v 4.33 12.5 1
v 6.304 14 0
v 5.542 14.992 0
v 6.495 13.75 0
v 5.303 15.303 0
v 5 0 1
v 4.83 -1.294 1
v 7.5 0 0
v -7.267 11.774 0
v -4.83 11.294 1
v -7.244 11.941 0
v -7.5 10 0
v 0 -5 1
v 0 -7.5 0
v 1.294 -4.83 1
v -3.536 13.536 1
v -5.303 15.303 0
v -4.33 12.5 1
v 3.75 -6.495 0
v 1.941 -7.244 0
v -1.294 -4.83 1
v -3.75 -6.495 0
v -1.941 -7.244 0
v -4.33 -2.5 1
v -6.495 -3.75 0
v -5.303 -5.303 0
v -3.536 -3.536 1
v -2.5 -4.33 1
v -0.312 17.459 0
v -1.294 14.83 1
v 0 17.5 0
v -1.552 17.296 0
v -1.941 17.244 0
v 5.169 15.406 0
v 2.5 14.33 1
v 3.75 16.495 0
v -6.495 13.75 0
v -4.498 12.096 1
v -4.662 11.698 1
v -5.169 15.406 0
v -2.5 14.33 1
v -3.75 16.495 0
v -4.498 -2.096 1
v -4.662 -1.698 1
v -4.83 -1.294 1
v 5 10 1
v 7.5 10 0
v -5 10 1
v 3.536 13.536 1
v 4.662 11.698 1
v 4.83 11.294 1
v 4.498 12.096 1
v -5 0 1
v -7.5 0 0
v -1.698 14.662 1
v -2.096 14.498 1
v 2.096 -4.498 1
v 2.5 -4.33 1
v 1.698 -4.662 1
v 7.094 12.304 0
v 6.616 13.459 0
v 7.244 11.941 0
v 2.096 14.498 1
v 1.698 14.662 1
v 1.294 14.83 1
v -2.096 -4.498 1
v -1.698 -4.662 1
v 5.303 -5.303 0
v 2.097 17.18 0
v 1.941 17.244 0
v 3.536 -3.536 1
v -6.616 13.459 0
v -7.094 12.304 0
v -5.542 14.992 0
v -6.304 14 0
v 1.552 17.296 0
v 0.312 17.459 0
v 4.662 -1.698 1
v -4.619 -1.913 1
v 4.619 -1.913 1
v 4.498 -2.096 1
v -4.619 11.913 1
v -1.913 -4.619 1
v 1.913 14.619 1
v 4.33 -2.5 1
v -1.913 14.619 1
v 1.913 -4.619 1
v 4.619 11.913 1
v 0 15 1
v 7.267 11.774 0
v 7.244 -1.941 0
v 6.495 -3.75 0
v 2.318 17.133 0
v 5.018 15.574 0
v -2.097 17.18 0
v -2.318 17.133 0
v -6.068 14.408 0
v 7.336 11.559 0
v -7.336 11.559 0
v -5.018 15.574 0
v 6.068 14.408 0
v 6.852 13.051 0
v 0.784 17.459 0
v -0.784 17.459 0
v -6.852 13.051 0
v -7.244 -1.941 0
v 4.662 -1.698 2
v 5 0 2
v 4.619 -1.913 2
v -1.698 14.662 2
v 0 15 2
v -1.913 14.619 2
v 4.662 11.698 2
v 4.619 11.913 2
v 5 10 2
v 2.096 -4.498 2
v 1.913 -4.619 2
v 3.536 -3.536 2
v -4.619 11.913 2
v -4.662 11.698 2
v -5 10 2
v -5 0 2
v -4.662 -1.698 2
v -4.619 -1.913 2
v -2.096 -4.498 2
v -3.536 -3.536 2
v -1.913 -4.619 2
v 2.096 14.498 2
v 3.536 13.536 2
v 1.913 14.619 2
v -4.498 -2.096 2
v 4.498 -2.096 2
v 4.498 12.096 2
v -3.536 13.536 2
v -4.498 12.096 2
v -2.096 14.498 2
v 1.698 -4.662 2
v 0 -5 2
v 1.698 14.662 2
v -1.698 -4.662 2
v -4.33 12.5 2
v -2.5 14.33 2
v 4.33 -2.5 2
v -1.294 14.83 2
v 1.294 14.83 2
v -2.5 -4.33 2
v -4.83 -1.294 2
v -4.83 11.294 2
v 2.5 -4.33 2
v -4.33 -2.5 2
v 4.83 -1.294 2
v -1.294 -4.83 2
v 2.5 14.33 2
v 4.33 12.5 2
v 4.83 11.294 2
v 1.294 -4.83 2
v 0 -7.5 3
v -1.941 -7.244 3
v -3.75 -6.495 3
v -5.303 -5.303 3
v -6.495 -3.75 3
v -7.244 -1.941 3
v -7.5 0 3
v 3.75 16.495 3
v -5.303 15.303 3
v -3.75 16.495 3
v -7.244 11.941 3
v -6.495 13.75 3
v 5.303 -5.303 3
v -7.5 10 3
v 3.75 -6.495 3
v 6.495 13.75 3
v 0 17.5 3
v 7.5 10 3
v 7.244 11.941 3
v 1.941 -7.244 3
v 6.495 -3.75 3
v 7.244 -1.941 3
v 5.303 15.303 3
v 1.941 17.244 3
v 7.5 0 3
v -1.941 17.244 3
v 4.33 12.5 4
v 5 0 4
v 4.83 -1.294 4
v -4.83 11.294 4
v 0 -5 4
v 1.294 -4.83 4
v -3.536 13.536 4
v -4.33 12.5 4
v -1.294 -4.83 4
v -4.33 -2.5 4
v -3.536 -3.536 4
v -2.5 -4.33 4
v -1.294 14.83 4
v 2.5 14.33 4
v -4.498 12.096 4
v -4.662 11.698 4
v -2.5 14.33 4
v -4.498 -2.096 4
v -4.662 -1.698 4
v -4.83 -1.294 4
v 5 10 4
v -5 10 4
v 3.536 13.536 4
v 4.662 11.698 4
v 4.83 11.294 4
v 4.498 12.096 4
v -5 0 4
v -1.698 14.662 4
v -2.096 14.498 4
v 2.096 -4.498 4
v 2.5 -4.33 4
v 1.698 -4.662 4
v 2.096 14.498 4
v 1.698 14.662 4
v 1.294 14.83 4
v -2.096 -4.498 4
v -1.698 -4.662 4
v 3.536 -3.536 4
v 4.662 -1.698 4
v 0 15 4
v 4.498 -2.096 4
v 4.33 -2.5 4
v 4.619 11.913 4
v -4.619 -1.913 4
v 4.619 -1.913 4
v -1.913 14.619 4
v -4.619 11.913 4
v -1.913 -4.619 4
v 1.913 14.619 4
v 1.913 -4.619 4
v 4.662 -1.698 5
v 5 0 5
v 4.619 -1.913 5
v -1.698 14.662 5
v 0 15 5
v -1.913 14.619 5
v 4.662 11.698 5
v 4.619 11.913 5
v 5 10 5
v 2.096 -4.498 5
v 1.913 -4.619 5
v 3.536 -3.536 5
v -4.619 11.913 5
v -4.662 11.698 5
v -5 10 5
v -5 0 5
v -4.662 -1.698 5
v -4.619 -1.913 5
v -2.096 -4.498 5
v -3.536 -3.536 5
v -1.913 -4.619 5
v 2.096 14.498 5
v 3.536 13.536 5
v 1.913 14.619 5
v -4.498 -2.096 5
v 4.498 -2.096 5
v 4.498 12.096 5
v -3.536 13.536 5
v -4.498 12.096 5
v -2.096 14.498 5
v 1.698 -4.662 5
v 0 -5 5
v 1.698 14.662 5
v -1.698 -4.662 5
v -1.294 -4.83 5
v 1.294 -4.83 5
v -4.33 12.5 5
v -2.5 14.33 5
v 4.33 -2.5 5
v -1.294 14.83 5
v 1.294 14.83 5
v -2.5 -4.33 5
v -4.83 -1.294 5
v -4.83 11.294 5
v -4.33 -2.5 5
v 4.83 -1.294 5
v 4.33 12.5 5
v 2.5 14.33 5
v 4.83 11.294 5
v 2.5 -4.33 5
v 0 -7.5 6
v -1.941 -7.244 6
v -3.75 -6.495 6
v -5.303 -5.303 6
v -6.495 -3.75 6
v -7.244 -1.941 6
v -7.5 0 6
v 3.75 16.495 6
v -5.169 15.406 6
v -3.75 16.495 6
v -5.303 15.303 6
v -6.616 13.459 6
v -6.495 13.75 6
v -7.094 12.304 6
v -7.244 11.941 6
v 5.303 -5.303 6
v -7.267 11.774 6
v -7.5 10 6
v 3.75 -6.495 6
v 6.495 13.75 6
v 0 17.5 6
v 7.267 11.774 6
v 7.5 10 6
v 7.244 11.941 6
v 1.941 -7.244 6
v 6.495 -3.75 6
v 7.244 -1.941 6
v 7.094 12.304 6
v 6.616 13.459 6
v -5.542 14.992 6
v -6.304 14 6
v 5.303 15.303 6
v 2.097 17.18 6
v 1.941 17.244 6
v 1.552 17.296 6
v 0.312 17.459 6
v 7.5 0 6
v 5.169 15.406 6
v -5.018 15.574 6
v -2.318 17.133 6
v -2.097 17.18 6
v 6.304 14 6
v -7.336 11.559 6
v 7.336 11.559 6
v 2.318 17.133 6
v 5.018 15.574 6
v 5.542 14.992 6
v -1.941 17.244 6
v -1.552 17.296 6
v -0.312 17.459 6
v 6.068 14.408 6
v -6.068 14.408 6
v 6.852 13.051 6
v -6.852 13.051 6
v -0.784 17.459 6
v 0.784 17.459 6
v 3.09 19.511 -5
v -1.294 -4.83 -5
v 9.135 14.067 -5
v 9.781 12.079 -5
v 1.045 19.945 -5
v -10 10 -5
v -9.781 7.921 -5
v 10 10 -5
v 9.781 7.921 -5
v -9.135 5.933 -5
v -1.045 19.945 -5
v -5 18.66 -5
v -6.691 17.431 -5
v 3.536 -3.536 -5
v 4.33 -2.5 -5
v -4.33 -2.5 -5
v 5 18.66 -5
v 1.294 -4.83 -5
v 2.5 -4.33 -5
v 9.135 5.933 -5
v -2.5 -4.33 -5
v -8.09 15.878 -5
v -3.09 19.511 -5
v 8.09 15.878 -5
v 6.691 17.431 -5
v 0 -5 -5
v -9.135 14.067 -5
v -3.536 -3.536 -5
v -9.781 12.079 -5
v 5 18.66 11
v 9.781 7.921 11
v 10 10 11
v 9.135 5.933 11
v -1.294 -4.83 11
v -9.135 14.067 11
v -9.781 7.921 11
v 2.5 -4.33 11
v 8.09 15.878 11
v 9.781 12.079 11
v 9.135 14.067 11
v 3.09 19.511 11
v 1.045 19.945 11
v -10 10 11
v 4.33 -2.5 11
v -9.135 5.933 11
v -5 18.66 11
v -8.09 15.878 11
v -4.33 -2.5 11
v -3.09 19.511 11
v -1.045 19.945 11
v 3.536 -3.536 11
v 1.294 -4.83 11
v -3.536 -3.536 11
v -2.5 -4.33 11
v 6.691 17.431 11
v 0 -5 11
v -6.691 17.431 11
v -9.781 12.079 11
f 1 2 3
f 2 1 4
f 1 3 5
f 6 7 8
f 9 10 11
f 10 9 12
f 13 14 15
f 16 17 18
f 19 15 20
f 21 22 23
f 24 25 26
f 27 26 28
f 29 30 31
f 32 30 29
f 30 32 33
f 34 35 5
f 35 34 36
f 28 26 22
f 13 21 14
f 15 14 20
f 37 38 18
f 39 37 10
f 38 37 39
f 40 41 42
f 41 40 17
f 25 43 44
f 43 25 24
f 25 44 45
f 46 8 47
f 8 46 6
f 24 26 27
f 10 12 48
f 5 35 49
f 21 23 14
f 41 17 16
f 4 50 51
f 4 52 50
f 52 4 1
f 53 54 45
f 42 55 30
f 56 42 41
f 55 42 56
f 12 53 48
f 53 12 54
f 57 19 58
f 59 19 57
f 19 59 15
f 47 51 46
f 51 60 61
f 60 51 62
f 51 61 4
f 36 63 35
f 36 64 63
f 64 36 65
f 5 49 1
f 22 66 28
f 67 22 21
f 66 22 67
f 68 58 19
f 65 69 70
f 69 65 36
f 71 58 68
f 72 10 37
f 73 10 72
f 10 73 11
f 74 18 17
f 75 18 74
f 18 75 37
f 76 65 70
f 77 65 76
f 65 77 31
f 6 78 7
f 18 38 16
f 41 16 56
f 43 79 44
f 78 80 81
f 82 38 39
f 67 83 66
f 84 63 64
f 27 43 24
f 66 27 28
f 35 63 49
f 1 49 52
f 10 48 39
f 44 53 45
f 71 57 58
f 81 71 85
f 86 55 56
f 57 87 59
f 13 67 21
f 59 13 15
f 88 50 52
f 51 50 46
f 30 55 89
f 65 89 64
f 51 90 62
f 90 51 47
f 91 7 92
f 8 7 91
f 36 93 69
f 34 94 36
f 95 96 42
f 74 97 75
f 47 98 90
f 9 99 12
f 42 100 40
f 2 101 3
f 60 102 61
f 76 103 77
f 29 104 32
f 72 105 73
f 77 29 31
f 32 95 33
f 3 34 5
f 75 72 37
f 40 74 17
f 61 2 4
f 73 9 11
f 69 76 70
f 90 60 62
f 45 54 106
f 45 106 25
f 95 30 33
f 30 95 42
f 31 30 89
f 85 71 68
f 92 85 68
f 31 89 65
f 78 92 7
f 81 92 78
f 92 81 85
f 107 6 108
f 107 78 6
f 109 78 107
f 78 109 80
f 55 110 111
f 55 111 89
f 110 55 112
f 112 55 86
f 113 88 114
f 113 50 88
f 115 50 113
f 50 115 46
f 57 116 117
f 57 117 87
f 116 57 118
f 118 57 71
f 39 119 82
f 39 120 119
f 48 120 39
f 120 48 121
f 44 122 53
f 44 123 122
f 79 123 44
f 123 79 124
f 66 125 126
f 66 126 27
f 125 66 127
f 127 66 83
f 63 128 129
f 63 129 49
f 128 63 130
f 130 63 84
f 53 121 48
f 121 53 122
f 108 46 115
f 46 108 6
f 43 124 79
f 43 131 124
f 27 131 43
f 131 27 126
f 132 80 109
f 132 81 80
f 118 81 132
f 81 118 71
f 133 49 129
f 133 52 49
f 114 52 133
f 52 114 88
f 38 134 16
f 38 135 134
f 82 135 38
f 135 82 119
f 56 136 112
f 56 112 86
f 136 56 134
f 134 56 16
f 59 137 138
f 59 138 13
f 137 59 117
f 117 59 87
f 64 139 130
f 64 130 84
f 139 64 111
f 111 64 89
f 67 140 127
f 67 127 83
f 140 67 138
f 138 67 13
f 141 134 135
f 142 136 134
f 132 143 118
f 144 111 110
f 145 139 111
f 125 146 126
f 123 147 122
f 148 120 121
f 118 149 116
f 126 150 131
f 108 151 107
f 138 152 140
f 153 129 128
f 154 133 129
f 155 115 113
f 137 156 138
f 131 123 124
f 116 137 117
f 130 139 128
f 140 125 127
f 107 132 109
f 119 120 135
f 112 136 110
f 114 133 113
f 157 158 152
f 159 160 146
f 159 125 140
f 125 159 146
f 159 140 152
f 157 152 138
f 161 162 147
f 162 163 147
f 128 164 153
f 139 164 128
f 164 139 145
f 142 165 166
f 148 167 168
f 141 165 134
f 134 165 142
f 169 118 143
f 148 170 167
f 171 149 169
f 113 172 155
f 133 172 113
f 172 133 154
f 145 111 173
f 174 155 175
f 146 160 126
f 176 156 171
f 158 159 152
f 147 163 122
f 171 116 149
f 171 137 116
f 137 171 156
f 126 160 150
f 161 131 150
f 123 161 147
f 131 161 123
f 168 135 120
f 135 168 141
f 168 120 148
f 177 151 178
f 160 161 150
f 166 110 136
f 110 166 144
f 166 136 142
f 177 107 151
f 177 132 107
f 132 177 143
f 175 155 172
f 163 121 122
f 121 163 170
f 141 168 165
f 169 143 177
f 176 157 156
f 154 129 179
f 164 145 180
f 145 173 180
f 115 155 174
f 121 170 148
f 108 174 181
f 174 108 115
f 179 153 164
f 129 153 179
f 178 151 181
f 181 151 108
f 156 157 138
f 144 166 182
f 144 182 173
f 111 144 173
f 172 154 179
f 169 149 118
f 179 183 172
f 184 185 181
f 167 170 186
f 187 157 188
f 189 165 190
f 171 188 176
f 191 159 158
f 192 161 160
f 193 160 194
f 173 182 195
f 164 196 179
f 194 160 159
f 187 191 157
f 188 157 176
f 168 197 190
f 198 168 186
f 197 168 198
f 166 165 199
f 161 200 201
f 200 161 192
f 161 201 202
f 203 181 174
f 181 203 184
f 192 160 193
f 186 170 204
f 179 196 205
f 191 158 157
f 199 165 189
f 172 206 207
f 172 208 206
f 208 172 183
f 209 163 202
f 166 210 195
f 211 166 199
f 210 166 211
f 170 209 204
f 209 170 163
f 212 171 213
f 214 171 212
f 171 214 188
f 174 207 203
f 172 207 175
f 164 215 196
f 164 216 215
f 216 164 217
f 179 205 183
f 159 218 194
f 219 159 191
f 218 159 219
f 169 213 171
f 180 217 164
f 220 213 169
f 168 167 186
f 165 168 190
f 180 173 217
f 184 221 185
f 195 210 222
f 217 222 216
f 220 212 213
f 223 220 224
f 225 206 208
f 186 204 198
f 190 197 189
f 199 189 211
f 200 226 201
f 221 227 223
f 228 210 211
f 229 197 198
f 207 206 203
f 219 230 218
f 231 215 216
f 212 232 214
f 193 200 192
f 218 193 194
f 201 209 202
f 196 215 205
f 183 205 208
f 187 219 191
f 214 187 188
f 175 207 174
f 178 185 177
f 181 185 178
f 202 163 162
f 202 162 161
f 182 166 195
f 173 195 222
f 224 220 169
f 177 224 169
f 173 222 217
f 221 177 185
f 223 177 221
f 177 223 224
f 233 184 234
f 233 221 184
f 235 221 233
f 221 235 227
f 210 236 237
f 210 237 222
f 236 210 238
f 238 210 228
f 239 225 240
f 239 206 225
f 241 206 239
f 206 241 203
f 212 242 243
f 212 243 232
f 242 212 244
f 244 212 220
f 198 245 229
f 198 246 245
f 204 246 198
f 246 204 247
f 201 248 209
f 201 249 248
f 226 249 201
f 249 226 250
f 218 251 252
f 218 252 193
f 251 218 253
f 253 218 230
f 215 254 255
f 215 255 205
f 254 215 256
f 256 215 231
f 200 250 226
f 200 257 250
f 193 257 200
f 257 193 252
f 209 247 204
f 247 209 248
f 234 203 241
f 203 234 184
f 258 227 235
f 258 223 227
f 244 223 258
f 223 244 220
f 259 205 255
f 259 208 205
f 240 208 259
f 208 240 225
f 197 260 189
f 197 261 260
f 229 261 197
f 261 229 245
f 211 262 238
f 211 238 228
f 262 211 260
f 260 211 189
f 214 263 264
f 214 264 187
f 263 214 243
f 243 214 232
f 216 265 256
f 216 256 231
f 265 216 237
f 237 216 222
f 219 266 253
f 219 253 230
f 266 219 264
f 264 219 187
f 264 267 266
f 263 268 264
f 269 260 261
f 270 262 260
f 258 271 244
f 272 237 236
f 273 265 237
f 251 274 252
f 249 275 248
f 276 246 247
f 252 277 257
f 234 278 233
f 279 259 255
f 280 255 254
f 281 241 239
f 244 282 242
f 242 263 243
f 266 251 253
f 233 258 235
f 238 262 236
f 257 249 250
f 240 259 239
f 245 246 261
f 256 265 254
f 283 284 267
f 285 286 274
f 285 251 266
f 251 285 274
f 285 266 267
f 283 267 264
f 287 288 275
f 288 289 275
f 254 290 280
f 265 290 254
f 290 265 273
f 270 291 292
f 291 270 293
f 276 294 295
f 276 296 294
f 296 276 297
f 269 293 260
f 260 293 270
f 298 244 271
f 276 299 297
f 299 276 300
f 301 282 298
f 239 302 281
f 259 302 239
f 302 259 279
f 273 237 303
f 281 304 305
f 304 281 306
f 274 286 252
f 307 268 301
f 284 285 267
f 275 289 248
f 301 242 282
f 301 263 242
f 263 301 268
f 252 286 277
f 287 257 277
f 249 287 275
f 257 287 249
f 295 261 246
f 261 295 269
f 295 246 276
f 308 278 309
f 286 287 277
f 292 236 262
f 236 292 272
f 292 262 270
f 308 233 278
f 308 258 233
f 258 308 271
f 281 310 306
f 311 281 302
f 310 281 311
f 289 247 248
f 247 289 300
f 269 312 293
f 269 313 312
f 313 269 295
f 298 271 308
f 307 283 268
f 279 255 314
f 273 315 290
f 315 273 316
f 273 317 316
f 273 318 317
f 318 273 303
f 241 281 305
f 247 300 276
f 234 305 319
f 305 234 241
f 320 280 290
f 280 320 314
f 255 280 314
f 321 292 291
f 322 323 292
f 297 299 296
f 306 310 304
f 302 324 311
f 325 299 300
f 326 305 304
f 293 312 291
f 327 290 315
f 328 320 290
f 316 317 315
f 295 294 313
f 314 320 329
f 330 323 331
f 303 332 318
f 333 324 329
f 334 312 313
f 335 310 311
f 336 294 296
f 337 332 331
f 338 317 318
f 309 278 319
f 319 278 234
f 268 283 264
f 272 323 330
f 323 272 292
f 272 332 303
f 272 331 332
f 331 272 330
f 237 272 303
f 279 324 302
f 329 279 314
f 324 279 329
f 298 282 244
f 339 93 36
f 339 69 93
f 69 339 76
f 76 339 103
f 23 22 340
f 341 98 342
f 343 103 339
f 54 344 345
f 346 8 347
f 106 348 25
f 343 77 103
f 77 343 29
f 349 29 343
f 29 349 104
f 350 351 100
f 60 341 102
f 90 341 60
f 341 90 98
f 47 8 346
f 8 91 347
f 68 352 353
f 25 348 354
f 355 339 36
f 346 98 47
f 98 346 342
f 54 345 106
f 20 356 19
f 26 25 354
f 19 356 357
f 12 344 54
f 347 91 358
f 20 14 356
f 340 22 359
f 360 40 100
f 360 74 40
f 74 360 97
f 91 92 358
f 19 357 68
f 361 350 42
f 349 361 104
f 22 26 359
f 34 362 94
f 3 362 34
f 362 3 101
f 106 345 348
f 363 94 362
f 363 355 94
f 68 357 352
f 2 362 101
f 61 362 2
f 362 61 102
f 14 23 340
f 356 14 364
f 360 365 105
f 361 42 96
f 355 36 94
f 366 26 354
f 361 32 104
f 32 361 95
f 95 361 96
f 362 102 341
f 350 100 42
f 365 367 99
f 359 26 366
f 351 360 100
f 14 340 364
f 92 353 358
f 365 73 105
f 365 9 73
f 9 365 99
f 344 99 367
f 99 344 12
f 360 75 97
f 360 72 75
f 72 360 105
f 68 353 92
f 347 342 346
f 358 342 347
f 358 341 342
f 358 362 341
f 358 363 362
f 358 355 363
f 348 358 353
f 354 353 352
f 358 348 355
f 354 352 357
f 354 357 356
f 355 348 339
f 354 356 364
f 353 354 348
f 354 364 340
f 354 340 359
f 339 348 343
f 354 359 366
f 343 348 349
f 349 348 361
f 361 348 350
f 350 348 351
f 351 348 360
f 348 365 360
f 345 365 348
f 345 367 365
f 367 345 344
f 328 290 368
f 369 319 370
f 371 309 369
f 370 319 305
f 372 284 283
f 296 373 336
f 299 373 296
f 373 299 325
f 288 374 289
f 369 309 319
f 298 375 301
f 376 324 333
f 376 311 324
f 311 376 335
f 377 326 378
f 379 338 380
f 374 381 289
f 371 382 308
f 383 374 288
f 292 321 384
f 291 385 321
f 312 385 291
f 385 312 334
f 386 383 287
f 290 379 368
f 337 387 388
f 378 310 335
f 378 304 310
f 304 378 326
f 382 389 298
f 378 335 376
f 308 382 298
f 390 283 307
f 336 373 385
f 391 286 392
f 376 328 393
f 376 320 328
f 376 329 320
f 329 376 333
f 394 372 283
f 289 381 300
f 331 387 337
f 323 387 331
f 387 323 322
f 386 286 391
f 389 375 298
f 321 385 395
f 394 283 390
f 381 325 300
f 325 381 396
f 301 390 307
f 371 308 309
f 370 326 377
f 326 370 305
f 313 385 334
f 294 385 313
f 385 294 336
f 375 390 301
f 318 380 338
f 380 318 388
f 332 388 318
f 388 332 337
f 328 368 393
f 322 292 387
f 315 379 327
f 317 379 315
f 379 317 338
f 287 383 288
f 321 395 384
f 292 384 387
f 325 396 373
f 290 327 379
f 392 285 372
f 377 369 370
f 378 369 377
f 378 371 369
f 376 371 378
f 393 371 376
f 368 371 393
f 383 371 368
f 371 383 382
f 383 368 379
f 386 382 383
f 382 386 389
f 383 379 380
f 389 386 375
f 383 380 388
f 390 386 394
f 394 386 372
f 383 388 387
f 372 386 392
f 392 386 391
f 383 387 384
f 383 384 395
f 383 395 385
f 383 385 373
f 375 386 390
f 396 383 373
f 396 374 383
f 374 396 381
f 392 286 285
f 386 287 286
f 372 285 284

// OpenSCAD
module spool() {
    a = 1;
    r1=7.5;
    r2=5;
    //middle
    hull() {
        translate( [0,0,0] )
            cylinder( r1=r1, r2=r2, h=a );
        translate( [0,10,0] )
            cylinder( r1=r1, r2=r2, h=a );
    }
    
    hull() {
        translate( [0,0,a] )
            cylinder( r1=r2, r2=r2, h=a );
        translate( [0,10,a] )
            cylinder( r1=r2, r2=r2, h=a );
    }
    hull() {
        translate( [0,0,2*a] )
            cylinder( r1=r2, r2=r1, h=a );
        translate( [0,10,2*a] )
            cylinder( r1=r2, r2=r1, h=a );
    }
}

// lower
translate([0,0,-5]) hull()
{
    cylinder( d1=10, d2=15, h=5 );
    translate( [0,10,0] ) cylinder( d1=20, d2=15, h=5 );
}

//upper
translate([0,0,6]) hull()
{
    cylinder( d1=15, d2=10, h=5 );
    translate( [0,10,0] ) cylinder( d1=15, d2=20, h=5 );
}

spool();
translate( [0,0,3] ) spool();
